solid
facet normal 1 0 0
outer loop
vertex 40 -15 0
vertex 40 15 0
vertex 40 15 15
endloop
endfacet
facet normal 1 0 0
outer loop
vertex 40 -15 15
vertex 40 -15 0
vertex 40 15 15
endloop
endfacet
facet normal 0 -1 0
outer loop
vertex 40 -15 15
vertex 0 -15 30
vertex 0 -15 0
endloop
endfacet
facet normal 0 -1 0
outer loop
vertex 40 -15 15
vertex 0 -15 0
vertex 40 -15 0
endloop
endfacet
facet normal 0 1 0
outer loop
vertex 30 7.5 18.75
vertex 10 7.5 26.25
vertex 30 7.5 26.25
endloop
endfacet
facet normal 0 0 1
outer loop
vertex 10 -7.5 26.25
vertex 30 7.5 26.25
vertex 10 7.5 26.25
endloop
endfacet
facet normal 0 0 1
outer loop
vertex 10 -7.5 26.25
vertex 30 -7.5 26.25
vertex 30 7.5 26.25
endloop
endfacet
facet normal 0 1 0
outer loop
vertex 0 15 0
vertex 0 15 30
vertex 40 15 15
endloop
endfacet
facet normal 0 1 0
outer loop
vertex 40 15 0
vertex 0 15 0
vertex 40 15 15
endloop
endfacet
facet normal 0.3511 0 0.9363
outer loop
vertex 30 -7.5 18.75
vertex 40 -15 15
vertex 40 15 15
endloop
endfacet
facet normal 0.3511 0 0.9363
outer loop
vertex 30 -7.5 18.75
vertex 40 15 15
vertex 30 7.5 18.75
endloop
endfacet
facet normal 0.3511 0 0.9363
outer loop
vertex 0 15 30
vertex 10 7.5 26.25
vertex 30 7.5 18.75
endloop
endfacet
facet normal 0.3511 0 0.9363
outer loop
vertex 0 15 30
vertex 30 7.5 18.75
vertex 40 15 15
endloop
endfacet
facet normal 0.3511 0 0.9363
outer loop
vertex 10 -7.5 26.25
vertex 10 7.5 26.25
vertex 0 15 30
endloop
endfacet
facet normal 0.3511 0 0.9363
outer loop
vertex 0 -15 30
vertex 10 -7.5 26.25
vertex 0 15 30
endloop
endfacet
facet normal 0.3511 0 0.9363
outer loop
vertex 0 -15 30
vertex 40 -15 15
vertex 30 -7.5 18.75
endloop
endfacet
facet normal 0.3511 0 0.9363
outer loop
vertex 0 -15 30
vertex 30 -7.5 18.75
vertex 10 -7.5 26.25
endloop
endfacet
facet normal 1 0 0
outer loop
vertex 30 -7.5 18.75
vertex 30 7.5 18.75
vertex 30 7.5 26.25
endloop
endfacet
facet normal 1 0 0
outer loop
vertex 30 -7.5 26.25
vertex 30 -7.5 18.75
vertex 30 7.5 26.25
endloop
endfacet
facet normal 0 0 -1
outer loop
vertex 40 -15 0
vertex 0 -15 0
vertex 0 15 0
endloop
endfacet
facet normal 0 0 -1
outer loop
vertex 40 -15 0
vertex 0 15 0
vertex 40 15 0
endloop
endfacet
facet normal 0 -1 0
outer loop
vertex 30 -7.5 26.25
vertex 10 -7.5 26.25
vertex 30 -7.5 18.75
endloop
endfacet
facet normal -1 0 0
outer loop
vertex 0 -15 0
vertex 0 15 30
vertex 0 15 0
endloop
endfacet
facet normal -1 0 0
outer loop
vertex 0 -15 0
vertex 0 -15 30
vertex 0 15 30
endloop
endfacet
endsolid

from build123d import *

# Parameters (mm, degrees)
F1_DEPTH = 15
F2_DEPTH = 7.5


with BuildPart() as f1:
    # F0 (on Front) → F1 (new body, symmetric)
    with BuildSketch(Plane.XZ):
        Polygon((0, 30), (0, 0), (40, 0), (40, 15), (30, 18.75), (10, 18.75), (10, 26.25), align=None)
        Polygon((30, 18.75), (10, 26.25), (10, 18.75), align=None)
    extrude(amount=F1_DEPTH, both=True)

    # F0 (on Front) → F2 (join, symmetric)
    with BuildSketch(Plane.XZ):
        Polygon((30, 26.25), (10, 26.25), (30, 18.75), align=None)
    extrude(amount=F2_DEPTH, both=True)


solid = f1.part
